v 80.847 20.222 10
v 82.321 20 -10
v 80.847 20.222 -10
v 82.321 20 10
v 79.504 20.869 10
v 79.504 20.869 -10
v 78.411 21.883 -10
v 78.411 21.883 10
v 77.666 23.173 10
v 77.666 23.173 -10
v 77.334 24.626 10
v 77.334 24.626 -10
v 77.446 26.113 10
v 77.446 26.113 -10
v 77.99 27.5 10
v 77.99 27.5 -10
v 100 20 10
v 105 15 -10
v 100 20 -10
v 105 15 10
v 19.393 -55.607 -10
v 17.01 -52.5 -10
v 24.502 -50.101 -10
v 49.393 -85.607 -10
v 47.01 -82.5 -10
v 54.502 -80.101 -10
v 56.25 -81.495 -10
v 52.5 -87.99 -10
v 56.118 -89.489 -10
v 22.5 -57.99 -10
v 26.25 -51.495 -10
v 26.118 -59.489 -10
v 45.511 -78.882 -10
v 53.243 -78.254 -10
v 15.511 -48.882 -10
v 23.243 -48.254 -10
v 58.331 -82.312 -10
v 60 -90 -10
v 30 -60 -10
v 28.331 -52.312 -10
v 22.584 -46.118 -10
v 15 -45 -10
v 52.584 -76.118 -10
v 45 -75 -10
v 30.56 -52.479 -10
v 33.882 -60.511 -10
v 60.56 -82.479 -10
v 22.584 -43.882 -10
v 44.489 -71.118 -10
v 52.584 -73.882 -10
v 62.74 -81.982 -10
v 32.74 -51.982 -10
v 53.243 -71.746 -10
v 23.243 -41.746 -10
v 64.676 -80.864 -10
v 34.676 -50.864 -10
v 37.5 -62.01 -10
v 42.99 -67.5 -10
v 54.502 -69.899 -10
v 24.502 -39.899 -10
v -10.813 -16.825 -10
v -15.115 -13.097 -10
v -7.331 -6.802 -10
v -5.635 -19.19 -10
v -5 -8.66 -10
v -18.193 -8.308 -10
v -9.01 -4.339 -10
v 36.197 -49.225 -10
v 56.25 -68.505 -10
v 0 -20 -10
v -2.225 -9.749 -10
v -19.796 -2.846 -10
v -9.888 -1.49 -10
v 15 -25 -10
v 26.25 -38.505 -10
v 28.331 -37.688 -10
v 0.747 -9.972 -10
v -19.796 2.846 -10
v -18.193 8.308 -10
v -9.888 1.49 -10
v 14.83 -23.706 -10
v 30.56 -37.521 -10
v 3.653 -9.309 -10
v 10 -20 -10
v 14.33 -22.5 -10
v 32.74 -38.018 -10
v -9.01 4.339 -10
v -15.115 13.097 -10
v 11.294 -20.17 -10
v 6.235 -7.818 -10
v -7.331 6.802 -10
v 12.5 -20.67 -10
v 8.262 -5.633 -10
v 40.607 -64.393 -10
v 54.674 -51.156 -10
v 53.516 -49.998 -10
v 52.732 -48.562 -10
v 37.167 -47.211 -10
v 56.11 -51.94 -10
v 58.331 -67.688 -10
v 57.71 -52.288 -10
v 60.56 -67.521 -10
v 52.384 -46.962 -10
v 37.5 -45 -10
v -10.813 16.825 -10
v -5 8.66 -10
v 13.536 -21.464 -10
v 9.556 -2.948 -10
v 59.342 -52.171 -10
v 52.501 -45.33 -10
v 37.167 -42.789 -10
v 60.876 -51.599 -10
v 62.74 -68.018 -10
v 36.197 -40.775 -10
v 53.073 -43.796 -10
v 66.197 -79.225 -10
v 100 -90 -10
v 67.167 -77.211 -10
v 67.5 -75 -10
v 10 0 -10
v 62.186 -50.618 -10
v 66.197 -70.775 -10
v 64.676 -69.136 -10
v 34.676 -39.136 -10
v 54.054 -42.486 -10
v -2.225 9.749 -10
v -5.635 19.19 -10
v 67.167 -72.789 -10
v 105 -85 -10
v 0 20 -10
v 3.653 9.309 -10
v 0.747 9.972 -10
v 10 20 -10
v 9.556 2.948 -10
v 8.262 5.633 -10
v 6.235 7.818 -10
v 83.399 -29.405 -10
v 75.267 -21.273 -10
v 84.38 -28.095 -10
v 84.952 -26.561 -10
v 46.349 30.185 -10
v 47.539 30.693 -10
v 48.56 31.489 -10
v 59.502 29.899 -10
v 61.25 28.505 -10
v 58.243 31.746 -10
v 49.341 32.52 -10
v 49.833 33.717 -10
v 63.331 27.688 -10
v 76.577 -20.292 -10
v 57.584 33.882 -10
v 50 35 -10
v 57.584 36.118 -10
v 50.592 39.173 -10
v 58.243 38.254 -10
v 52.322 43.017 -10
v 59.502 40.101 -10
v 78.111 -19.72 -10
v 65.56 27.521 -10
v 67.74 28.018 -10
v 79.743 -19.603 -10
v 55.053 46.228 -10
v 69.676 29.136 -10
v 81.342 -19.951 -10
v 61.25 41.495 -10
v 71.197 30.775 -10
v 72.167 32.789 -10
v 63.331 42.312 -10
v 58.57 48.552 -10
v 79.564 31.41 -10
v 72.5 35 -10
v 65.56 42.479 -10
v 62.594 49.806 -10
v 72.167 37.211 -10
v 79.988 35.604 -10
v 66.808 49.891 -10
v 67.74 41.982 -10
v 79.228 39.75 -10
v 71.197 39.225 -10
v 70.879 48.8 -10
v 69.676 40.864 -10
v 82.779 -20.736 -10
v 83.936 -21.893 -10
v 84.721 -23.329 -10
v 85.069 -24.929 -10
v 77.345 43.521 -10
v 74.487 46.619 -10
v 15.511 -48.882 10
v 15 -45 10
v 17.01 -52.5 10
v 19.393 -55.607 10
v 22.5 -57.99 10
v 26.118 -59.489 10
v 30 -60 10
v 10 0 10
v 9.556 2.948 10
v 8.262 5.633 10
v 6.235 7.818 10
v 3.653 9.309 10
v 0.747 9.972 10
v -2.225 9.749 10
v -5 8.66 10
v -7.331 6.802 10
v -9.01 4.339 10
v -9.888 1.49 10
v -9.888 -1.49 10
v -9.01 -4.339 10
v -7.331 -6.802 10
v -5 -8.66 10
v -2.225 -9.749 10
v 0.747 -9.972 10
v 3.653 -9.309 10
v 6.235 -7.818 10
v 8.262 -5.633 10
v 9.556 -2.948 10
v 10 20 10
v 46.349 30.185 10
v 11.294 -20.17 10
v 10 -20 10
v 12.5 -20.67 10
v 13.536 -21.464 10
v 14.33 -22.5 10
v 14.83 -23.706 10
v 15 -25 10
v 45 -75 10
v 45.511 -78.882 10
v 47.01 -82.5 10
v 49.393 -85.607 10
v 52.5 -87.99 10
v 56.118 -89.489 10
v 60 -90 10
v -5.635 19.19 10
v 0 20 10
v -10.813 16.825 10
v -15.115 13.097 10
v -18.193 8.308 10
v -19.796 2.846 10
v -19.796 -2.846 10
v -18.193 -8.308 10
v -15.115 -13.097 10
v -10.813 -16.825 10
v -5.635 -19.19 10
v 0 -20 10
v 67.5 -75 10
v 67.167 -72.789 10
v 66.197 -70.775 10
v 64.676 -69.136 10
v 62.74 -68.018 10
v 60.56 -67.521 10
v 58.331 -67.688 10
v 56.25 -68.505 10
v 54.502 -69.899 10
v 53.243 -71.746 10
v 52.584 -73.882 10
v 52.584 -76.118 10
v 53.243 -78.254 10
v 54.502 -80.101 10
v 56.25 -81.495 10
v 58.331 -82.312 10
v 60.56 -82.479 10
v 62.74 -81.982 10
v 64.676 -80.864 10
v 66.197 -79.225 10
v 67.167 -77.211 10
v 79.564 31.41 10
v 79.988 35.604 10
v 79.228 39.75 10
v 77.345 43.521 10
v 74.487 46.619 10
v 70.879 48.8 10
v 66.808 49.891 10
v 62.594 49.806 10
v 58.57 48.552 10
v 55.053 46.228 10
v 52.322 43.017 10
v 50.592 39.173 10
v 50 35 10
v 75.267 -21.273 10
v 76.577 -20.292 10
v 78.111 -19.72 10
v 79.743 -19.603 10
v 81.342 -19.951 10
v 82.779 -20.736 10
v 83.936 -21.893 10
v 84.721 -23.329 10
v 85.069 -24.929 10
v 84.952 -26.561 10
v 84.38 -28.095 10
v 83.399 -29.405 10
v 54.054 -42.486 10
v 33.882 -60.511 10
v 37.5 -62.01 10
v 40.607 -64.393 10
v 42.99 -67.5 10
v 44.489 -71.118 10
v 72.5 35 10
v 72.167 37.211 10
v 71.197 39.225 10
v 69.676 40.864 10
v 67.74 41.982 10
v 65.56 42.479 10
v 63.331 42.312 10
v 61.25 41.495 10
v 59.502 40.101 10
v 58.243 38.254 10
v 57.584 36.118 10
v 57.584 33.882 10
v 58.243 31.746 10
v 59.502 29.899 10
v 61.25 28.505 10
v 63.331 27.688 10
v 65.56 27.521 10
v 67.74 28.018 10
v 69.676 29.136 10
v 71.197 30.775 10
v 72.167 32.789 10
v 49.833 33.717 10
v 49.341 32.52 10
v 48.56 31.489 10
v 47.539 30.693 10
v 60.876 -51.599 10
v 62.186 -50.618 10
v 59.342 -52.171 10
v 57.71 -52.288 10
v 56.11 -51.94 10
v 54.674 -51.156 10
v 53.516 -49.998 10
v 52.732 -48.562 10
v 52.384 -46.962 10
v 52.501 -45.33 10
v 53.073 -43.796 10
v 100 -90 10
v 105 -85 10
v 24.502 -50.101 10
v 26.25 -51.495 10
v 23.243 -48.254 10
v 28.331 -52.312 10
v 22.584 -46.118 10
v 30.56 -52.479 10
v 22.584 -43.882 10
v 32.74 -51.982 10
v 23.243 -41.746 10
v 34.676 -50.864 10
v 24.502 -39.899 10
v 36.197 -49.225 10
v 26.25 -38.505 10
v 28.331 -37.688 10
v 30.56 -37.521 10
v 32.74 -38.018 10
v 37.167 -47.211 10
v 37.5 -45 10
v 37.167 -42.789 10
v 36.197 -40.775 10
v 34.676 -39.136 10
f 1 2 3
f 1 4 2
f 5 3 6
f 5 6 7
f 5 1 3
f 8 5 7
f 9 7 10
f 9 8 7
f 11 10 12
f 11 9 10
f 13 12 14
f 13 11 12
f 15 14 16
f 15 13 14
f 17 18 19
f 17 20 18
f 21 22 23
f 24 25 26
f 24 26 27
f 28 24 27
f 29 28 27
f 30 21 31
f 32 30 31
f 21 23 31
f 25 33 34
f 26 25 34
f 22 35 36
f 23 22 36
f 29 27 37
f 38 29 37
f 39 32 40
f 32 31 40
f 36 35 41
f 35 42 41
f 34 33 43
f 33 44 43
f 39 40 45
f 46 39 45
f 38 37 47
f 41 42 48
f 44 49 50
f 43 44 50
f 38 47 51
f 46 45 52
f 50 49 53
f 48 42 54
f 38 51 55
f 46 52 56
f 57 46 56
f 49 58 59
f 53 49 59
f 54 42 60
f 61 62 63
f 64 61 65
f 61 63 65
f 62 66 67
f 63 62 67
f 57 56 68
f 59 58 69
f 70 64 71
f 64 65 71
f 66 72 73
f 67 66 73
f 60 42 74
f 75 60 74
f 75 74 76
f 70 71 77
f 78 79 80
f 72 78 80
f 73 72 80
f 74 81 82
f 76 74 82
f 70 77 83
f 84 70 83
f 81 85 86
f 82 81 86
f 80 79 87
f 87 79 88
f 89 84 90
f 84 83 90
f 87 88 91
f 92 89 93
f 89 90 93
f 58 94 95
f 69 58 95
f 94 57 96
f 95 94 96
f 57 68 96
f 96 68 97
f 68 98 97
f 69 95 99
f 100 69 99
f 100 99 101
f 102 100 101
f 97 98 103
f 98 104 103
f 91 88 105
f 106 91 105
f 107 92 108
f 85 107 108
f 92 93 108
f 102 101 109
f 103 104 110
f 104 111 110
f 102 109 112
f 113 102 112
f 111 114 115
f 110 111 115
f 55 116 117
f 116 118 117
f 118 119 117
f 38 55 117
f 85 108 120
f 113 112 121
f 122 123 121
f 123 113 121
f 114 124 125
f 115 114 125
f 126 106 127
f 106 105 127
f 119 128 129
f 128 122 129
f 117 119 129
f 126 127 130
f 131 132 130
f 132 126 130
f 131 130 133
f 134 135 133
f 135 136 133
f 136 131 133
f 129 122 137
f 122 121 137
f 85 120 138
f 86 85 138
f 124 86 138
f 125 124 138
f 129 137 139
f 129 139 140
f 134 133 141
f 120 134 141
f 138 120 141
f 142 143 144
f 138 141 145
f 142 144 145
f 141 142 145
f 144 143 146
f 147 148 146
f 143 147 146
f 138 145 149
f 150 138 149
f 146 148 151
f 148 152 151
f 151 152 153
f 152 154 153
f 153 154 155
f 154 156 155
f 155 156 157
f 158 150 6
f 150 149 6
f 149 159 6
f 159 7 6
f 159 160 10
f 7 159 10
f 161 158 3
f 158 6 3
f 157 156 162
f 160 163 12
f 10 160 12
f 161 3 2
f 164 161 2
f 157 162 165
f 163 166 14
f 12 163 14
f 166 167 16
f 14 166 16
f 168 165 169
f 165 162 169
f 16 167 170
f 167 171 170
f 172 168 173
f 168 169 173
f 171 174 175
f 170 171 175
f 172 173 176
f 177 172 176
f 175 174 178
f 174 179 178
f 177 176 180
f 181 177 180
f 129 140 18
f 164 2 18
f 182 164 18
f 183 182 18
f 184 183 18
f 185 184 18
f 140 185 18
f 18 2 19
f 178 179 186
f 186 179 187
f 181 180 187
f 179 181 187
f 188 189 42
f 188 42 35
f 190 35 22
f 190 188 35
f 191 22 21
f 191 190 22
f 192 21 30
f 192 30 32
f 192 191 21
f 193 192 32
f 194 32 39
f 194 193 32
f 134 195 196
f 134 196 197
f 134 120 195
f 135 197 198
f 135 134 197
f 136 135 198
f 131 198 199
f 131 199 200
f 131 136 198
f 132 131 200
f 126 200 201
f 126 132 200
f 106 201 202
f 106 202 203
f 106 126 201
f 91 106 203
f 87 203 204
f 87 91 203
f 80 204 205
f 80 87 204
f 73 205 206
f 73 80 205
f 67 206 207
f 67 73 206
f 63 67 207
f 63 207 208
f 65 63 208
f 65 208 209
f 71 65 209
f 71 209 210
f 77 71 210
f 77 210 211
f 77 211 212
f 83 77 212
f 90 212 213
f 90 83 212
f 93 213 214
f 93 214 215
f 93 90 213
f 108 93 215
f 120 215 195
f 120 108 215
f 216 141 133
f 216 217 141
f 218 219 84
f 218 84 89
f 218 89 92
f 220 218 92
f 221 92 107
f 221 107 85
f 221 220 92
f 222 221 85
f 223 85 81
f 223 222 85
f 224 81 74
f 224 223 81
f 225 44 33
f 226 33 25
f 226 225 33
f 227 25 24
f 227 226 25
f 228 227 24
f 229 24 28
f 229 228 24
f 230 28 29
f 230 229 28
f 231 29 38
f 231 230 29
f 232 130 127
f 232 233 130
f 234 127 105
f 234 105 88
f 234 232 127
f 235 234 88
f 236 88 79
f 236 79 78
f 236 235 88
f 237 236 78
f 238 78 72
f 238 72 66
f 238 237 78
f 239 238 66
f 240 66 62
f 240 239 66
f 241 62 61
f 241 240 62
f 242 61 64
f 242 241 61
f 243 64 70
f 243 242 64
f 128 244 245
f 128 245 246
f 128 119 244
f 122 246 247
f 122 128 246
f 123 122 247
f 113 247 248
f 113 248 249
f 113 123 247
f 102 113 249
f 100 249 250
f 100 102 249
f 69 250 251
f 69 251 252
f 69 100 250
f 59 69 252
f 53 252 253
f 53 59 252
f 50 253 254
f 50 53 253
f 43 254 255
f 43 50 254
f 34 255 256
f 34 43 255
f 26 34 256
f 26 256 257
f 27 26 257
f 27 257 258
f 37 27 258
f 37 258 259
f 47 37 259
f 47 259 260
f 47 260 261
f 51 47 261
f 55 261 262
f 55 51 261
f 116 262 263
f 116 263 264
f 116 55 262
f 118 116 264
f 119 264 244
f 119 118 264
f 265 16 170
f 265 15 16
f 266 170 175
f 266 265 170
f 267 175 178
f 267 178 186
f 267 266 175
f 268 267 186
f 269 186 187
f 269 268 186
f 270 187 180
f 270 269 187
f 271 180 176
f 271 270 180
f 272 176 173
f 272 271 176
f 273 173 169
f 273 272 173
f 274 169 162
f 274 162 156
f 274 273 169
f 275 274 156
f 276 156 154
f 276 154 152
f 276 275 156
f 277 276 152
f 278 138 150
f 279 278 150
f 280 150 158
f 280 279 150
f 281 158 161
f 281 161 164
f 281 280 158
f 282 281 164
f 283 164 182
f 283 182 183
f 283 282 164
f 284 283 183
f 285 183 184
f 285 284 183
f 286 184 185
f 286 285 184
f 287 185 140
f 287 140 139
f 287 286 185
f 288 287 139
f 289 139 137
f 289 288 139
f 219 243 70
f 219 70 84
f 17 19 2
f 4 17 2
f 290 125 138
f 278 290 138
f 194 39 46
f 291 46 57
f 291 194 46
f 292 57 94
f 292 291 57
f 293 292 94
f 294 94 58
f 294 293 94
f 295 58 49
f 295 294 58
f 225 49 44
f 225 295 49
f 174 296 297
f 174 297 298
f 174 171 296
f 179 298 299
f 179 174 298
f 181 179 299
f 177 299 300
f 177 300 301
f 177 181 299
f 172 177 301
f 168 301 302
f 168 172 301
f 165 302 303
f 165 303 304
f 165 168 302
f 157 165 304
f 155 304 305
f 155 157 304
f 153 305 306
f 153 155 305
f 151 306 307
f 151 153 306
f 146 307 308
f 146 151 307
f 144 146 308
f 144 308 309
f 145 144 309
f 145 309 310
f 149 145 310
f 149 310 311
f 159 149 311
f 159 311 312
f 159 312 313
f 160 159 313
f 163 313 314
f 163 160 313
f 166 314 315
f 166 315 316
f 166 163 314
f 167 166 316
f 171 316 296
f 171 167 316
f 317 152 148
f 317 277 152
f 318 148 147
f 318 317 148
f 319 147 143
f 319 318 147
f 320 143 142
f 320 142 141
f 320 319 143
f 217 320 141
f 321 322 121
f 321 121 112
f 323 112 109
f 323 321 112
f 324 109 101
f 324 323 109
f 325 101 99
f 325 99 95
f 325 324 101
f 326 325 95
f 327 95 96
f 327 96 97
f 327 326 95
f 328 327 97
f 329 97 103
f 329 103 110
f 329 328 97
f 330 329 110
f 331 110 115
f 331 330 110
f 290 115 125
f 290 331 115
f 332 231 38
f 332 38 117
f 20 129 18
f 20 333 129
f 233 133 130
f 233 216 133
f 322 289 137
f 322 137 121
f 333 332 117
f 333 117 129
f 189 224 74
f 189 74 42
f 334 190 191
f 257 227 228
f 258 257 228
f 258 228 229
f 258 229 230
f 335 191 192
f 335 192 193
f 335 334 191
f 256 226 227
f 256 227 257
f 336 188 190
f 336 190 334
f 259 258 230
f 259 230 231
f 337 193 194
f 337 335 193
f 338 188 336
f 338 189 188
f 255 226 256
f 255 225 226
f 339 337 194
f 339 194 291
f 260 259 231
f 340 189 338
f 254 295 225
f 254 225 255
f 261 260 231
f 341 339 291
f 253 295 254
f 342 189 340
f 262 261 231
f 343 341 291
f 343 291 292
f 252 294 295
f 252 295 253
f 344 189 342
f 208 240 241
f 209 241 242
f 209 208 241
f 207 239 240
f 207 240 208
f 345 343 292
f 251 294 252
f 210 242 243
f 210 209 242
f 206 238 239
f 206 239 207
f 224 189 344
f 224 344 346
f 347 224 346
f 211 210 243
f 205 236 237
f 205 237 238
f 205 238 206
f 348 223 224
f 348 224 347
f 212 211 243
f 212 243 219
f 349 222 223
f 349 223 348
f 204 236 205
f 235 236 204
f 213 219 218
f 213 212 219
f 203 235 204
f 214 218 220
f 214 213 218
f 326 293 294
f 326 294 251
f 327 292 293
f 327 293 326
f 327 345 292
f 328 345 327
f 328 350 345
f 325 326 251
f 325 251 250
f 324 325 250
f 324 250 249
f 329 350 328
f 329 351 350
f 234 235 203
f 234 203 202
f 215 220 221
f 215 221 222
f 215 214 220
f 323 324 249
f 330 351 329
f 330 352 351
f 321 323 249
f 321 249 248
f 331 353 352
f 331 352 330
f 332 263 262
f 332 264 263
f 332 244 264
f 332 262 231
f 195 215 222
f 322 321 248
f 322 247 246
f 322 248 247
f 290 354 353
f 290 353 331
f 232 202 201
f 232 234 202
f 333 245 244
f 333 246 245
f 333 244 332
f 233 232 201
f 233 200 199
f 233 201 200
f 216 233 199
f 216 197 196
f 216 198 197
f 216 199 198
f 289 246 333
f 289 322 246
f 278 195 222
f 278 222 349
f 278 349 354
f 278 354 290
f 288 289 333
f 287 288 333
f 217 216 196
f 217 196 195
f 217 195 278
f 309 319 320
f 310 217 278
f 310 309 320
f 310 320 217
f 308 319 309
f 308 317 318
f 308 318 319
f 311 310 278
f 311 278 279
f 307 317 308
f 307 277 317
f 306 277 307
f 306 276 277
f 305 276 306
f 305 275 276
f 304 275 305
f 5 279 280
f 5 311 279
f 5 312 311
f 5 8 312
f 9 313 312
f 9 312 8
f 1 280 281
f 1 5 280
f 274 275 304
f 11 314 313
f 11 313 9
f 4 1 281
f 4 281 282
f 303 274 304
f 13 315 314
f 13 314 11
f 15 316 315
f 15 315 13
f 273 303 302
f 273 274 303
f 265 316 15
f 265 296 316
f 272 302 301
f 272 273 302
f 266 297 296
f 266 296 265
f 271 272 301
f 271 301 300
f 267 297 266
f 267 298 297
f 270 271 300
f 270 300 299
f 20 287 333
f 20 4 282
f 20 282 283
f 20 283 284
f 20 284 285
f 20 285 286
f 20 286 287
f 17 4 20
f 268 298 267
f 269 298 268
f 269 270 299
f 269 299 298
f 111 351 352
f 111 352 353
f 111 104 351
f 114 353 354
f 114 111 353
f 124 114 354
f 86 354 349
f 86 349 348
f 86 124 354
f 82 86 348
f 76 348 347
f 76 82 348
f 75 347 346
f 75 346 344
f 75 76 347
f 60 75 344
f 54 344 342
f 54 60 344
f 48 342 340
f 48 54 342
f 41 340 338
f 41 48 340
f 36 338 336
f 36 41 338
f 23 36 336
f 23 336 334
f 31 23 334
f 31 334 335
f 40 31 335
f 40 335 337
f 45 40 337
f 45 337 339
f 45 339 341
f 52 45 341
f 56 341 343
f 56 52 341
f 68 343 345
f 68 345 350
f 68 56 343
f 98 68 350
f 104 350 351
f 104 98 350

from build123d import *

# Parameters (mm, degrees)
SKETCH1_R           = 7.5
SKETCH1_R_2         = 10
BOSS_EXTRUDE1_DEPTH = 10


with BuildPart() as part:
    # Sketch1 → Boss-Extrude1 (new, symmetric)
    with BuildSketch(Plane.XY):
        with BuildLine():
            ThreePointArc((0, 20), (-20, 0), (0, -20))
            Line((0, -20), (10, -20))
            ThreePointArc((10, -20), (13.535533906, -21.464466094), (15, -25))
            Line((15, -25), (15, -45))
            ThreePointArc((15, -45), (19.393398282, -55.606601718), (30, -60))
            ThreePointArc((30, -60), (40.606601718, -64.393398282), (45, -75))
            ThreePointArc((45, -75), (49.393398282, -85.606601718), (60, -90))
            Line((60, -90), (100, -90))
            Line((100, -90), (105, -85))
            Line((105, -85), (105, 15))
            Line((105, 15), (100, 20))
            Line((100, 20), (82.320508076, 20))
            ThreePointArc((82.320508076, 20), (77.990381057, 22.5), (77.990381057, 27.5))
            ThreePointArc((77.990381057, 27.5), (68.882285677, 49.488887394), (50, 35))
            ThreePointArc((50, 35), (48.984060464, 31.978864085), (46.349095113, 30.185444737))
            Line((46.349095113, 30.185444737), (10, 20))
            Line((10, 20), (0, 20))
        make_face()
        with Locations((30, -45)):
            Circle(SKETCH1_R, mode=Mode.SUBTRACT)
        with Locations((60, -75)):
            Circle(SKETCH1_R, mode=Mode.SUBTRACT)
        with BuildLine():
            ThreePointArc((62.185835481, -50.618244574), (54.053641254, -50.618244574), (54.053641254, -42.486050347))
            Line((54.053641254, -42.486050347), (75.26684469, -21.272846911))
            ThreePointArc((75.26684469, -21.272846911), (83.399038917, -21.272846911), (83.399038917, -29.405041138))
            Line((83.399038917, -29.405041138), (62.185835481, -50.618244574))
        make_face(mode=Mode.SUBTRACT)
        Circle(SKETCH1_R_2, mode=Mode.SUBTRACT)
        with Locations((65, 35)):
            Circle(SKETCH1_R, mode=Mode.SUBTRACT)
    extrude(amount=BOSS_EXTRUDE1_DEPTH, both=True)


solid = part.part
